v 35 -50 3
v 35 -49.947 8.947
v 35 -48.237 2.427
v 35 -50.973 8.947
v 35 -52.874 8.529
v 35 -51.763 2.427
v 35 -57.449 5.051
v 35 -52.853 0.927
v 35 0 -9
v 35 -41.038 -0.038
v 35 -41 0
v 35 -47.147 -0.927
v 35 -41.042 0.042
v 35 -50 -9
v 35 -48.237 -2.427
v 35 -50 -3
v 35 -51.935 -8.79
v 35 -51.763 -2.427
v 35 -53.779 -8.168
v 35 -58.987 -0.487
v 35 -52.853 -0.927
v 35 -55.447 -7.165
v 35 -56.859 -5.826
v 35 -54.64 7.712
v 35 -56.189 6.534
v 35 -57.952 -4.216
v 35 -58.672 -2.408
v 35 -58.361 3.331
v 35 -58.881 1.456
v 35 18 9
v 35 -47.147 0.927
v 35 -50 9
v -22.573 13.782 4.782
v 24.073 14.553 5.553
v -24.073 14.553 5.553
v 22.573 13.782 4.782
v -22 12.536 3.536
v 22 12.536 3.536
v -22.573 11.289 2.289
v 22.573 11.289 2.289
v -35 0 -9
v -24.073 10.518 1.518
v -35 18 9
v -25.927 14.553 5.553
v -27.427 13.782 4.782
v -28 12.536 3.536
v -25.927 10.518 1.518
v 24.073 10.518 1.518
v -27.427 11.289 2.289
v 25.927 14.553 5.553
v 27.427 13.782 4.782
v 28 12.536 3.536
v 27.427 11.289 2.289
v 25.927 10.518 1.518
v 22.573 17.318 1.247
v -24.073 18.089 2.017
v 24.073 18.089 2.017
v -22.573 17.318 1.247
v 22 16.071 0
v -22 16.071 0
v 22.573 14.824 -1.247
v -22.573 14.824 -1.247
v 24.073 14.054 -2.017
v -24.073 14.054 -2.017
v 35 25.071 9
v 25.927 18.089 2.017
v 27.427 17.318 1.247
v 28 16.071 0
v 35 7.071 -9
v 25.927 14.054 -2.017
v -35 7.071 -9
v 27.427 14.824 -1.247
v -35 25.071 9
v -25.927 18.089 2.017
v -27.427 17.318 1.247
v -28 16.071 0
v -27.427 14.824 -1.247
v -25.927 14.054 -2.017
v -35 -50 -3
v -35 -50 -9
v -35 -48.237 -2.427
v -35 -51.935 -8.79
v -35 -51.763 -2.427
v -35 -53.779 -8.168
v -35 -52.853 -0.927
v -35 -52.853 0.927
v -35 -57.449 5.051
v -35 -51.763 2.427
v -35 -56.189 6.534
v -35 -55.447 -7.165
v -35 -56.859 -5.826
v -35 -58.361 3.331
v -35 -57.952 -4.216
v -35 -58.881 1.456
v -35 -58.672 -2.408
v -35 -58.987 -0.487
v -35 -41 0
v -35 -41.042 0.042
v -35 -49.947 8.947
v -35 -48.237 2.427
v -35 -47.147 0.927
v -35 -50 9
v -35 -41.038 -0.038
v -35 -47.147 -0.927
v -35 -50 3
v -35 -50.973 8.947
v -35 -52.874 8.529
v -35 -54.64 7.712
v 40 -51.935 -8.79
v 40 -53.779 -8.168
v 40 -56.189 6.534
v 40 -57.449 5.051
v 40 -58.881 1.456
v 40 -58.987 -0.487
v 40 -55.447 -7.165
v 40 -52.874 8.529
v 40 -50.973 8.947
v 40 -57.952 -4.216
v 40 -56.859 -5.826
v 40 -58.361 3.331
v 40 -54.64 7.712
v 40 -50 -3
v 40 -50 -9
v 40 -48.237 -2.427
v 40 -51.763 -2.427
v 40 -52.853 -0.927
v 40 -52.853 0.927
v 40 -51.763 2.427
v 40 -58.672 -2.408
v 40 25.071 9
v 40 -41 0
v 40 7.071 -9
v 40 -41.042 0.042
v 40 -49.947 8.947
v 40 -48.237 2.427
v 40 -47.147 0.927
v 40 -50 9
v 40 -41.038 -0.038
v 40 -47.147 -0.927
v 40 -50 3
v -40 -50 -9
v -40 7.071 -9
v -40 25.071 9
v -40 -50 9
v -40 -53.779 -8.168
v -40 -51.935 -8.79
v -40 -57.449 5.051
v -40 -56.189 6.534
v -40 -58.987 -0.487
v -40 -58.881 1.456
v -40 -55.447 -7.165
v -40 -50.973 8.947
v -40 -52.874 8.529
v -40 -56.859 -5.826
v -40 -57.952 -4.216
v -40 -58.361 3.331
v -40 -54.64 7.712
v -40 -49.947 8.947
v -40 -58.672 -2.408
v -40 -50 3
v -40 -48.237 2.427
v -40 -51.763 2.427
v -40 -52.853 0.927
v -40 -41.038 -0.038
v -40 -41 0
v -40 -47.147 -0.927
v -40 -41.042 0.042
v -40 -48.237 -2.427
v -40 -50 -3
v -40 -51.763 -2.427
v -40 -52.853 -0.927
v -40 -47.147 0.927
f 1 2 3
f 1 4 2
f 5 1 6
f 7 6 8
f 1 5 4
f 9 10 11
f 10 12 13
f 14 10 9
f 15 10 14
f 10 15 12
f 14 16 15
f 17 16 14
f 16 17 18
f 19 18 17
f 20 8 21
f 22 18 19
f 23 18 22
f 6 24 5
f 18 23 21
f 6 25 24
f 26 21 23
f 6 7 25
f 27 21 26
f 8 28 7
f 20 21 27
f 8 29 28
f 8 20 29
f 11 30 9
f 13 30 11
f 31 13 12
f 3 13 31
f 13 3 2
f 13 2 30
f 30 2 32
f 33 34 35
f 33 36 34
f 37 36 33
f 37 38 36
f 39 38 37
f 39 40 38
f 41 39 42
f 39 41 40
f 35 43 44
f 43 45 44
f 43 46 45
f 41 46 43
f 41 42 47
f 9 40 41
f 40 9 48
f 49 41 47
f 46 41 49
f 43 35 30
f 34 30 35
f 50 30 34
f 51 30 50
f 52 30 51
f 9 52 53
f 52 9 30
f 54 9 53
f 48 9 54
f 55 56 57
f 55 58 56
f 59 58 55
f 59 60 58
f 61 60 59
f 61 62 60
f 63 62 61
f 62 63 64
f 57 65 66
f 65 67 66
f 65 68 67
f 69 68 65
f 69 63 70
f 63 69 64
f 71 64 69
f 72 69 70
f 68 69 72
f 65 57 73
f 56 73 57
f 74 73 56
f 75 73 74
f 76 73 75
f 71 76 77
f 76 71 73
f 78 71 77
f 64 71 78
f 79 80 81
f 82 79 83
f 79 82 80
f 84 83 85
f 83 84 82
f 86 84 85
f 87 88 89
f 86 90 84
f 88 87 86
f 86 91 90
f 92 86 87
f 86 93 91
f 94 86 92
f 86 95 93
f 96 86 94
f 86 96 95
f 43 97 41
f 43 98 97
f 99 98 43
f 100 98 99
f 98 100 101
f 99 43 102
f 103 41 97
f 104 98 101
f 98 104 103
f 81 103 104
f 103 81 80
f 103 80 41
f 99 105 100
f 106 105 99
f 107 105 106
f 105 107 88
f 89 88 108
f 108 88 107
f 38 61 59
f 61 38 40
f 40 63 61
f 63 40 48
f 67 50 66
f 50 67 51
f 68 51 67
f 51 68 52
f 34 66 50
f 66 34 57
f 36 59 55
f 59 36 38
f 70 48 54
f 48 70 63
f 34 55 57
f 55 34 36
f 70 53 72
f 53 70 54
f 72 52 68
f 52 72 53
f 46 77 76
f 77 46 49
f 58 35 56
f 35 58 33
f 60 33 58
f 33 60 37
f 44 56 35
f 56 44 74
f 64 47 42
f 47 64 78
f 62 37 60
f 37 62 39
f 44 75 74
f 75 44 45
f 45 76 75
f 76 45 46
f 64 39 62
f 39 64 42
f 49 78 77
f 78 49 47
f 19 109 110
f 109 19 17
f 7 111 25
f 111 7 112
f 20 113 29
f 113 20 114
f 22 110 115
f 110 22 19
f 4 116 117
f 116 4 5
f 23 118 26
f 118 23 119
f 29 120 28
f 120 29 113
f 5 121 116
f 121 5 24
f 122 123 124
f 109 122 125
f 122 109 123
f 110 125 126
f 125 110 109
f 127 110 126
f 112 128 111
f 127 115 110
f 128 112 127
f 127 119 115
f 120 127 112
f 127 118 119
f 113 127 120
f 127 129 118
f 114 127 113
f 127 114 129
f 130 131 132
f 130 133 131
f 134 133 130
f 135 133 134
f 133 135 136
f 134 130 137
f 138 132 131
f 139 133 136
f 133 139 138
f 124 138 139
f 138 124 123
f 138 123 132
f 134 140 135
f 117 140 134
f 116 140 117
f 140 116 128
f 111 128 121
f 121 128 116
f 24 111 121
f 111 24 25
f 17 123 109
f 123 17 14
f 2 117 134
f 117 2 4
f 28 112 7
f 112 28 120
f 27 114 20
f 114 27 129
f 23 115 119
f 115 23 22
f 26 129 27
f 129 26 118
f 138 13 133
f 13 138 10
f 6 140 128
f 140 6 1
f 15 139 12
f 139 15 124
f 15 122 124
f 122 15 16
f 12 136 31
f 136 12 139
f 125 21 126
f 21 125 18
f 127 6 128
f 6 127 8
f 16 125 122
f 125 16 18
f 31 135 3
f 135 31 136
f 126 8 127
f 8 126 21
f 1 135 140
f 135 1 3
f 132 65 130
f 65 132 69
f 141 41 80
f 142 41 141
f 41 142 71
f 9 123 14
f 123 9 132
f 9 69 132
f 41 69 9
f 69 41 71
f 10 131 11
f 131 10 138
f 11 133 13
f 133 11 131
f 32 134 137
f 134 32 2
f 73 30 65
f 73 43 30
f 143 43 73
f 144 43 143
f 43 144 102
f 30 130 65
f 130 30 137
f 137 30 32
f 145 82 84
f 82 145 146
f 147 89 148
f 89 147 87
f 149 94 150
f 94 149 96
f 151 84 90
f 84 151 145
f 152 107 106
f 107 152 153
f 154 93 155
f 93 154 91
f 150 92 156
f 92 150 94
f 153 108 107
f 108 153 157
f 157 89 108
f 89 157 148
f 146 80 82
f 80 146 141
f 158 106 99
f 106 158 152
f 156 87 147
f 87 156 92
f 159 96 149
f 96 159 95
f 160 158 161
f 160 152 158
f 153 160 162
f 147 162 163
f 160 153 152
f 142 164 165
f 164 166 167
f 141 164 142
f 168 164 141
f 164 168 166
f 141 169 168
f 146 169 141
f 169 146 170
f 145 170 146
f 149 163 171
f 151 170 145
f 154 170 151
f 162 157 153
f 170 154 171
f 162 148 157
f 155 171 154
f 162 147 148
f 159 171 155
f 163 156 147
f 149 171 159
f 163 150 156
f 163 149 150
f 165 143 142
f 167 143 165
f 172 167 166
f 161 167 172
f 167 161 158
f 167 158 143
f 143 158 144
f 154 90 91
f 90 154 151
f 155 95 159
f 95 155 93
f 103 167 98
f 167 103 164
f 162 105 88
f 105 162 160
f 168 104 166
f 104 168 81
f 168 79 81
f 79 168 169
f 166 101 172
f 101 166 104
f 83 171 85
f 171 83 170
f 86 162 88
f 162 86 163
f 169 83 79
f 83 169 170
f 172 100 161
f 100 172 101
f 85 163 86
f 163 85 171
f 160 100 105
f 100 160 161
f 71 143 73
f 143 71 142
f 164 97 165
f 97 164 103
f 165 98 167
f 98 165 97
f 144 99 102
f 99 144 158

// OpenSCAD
// Rack Boss Outside Width
design_width = 70; // [62:100]
// center of bolts to bottom edge of light mount (i.e. cable clearance)
design_height = 50; // [20:75]
// Part Thickness
thickness = 5.0; //[4,5,6]

/* [Hidden] */

holes = 6;
base_width = 18;
t = thickness;
sin45 = 1/sqrt(2);
tan45 = sqrt(2);
height = design_height + base_width/2 + t*tan45;
width = design_width;

//define base



module base () {
    rotate([45,0,0]) {
        union()
            difference(){
                cube(size=[width, base_width*2, thickness], center=true);
                
                translate([25,t/2,0])
                    cylinder(thickness*4, d=holes, center=true);
                translate([-25,t/2,0])
                    cylinder(thickness*4, d=holes, center=true);
            }
        }
}

//design flange
module flange () {
   union() {
        translate([thickness/2, 0, 0])
            rotate([0,-90,0])
                    linear_extrude(thickness)
                        polygon(points=[
                            [base_width/2,0],
                            [0, -base_width/2],
                            [0, -height],
                            [base_width/2, -height+base_width/2],
                            [base_width, -height],
                            [base_width, base_width/2],
                            [base_width/2,0] 
                        ]);
        translate([0,-height,base_width/2]) 
            rotate([0,90,0])
                difference() {
                    cylinder(thickness, d=base_width, center=true);
                    cylinder(thickness*2, d=holes, center=true);
                }
    }
}

//build
translate([0, base_width/2 + t*tan45, 0])
difference() {
    union() {
        translate([0, -tan45*t/2, 0]) base();
        translate([(width + t)/2, 0, -base_width/2]) flange();
        translate([(width + t)/-2, 0, -base_width/2]) flange();
    }
    translate([0,0, base_width/2+t]) cube(size=[2*width, 2*width, 2*t], center=true);
    translate([0,0, -base_width/2-t]) cube(size=[2*width, 2*width, 2*t], center=true);
}
